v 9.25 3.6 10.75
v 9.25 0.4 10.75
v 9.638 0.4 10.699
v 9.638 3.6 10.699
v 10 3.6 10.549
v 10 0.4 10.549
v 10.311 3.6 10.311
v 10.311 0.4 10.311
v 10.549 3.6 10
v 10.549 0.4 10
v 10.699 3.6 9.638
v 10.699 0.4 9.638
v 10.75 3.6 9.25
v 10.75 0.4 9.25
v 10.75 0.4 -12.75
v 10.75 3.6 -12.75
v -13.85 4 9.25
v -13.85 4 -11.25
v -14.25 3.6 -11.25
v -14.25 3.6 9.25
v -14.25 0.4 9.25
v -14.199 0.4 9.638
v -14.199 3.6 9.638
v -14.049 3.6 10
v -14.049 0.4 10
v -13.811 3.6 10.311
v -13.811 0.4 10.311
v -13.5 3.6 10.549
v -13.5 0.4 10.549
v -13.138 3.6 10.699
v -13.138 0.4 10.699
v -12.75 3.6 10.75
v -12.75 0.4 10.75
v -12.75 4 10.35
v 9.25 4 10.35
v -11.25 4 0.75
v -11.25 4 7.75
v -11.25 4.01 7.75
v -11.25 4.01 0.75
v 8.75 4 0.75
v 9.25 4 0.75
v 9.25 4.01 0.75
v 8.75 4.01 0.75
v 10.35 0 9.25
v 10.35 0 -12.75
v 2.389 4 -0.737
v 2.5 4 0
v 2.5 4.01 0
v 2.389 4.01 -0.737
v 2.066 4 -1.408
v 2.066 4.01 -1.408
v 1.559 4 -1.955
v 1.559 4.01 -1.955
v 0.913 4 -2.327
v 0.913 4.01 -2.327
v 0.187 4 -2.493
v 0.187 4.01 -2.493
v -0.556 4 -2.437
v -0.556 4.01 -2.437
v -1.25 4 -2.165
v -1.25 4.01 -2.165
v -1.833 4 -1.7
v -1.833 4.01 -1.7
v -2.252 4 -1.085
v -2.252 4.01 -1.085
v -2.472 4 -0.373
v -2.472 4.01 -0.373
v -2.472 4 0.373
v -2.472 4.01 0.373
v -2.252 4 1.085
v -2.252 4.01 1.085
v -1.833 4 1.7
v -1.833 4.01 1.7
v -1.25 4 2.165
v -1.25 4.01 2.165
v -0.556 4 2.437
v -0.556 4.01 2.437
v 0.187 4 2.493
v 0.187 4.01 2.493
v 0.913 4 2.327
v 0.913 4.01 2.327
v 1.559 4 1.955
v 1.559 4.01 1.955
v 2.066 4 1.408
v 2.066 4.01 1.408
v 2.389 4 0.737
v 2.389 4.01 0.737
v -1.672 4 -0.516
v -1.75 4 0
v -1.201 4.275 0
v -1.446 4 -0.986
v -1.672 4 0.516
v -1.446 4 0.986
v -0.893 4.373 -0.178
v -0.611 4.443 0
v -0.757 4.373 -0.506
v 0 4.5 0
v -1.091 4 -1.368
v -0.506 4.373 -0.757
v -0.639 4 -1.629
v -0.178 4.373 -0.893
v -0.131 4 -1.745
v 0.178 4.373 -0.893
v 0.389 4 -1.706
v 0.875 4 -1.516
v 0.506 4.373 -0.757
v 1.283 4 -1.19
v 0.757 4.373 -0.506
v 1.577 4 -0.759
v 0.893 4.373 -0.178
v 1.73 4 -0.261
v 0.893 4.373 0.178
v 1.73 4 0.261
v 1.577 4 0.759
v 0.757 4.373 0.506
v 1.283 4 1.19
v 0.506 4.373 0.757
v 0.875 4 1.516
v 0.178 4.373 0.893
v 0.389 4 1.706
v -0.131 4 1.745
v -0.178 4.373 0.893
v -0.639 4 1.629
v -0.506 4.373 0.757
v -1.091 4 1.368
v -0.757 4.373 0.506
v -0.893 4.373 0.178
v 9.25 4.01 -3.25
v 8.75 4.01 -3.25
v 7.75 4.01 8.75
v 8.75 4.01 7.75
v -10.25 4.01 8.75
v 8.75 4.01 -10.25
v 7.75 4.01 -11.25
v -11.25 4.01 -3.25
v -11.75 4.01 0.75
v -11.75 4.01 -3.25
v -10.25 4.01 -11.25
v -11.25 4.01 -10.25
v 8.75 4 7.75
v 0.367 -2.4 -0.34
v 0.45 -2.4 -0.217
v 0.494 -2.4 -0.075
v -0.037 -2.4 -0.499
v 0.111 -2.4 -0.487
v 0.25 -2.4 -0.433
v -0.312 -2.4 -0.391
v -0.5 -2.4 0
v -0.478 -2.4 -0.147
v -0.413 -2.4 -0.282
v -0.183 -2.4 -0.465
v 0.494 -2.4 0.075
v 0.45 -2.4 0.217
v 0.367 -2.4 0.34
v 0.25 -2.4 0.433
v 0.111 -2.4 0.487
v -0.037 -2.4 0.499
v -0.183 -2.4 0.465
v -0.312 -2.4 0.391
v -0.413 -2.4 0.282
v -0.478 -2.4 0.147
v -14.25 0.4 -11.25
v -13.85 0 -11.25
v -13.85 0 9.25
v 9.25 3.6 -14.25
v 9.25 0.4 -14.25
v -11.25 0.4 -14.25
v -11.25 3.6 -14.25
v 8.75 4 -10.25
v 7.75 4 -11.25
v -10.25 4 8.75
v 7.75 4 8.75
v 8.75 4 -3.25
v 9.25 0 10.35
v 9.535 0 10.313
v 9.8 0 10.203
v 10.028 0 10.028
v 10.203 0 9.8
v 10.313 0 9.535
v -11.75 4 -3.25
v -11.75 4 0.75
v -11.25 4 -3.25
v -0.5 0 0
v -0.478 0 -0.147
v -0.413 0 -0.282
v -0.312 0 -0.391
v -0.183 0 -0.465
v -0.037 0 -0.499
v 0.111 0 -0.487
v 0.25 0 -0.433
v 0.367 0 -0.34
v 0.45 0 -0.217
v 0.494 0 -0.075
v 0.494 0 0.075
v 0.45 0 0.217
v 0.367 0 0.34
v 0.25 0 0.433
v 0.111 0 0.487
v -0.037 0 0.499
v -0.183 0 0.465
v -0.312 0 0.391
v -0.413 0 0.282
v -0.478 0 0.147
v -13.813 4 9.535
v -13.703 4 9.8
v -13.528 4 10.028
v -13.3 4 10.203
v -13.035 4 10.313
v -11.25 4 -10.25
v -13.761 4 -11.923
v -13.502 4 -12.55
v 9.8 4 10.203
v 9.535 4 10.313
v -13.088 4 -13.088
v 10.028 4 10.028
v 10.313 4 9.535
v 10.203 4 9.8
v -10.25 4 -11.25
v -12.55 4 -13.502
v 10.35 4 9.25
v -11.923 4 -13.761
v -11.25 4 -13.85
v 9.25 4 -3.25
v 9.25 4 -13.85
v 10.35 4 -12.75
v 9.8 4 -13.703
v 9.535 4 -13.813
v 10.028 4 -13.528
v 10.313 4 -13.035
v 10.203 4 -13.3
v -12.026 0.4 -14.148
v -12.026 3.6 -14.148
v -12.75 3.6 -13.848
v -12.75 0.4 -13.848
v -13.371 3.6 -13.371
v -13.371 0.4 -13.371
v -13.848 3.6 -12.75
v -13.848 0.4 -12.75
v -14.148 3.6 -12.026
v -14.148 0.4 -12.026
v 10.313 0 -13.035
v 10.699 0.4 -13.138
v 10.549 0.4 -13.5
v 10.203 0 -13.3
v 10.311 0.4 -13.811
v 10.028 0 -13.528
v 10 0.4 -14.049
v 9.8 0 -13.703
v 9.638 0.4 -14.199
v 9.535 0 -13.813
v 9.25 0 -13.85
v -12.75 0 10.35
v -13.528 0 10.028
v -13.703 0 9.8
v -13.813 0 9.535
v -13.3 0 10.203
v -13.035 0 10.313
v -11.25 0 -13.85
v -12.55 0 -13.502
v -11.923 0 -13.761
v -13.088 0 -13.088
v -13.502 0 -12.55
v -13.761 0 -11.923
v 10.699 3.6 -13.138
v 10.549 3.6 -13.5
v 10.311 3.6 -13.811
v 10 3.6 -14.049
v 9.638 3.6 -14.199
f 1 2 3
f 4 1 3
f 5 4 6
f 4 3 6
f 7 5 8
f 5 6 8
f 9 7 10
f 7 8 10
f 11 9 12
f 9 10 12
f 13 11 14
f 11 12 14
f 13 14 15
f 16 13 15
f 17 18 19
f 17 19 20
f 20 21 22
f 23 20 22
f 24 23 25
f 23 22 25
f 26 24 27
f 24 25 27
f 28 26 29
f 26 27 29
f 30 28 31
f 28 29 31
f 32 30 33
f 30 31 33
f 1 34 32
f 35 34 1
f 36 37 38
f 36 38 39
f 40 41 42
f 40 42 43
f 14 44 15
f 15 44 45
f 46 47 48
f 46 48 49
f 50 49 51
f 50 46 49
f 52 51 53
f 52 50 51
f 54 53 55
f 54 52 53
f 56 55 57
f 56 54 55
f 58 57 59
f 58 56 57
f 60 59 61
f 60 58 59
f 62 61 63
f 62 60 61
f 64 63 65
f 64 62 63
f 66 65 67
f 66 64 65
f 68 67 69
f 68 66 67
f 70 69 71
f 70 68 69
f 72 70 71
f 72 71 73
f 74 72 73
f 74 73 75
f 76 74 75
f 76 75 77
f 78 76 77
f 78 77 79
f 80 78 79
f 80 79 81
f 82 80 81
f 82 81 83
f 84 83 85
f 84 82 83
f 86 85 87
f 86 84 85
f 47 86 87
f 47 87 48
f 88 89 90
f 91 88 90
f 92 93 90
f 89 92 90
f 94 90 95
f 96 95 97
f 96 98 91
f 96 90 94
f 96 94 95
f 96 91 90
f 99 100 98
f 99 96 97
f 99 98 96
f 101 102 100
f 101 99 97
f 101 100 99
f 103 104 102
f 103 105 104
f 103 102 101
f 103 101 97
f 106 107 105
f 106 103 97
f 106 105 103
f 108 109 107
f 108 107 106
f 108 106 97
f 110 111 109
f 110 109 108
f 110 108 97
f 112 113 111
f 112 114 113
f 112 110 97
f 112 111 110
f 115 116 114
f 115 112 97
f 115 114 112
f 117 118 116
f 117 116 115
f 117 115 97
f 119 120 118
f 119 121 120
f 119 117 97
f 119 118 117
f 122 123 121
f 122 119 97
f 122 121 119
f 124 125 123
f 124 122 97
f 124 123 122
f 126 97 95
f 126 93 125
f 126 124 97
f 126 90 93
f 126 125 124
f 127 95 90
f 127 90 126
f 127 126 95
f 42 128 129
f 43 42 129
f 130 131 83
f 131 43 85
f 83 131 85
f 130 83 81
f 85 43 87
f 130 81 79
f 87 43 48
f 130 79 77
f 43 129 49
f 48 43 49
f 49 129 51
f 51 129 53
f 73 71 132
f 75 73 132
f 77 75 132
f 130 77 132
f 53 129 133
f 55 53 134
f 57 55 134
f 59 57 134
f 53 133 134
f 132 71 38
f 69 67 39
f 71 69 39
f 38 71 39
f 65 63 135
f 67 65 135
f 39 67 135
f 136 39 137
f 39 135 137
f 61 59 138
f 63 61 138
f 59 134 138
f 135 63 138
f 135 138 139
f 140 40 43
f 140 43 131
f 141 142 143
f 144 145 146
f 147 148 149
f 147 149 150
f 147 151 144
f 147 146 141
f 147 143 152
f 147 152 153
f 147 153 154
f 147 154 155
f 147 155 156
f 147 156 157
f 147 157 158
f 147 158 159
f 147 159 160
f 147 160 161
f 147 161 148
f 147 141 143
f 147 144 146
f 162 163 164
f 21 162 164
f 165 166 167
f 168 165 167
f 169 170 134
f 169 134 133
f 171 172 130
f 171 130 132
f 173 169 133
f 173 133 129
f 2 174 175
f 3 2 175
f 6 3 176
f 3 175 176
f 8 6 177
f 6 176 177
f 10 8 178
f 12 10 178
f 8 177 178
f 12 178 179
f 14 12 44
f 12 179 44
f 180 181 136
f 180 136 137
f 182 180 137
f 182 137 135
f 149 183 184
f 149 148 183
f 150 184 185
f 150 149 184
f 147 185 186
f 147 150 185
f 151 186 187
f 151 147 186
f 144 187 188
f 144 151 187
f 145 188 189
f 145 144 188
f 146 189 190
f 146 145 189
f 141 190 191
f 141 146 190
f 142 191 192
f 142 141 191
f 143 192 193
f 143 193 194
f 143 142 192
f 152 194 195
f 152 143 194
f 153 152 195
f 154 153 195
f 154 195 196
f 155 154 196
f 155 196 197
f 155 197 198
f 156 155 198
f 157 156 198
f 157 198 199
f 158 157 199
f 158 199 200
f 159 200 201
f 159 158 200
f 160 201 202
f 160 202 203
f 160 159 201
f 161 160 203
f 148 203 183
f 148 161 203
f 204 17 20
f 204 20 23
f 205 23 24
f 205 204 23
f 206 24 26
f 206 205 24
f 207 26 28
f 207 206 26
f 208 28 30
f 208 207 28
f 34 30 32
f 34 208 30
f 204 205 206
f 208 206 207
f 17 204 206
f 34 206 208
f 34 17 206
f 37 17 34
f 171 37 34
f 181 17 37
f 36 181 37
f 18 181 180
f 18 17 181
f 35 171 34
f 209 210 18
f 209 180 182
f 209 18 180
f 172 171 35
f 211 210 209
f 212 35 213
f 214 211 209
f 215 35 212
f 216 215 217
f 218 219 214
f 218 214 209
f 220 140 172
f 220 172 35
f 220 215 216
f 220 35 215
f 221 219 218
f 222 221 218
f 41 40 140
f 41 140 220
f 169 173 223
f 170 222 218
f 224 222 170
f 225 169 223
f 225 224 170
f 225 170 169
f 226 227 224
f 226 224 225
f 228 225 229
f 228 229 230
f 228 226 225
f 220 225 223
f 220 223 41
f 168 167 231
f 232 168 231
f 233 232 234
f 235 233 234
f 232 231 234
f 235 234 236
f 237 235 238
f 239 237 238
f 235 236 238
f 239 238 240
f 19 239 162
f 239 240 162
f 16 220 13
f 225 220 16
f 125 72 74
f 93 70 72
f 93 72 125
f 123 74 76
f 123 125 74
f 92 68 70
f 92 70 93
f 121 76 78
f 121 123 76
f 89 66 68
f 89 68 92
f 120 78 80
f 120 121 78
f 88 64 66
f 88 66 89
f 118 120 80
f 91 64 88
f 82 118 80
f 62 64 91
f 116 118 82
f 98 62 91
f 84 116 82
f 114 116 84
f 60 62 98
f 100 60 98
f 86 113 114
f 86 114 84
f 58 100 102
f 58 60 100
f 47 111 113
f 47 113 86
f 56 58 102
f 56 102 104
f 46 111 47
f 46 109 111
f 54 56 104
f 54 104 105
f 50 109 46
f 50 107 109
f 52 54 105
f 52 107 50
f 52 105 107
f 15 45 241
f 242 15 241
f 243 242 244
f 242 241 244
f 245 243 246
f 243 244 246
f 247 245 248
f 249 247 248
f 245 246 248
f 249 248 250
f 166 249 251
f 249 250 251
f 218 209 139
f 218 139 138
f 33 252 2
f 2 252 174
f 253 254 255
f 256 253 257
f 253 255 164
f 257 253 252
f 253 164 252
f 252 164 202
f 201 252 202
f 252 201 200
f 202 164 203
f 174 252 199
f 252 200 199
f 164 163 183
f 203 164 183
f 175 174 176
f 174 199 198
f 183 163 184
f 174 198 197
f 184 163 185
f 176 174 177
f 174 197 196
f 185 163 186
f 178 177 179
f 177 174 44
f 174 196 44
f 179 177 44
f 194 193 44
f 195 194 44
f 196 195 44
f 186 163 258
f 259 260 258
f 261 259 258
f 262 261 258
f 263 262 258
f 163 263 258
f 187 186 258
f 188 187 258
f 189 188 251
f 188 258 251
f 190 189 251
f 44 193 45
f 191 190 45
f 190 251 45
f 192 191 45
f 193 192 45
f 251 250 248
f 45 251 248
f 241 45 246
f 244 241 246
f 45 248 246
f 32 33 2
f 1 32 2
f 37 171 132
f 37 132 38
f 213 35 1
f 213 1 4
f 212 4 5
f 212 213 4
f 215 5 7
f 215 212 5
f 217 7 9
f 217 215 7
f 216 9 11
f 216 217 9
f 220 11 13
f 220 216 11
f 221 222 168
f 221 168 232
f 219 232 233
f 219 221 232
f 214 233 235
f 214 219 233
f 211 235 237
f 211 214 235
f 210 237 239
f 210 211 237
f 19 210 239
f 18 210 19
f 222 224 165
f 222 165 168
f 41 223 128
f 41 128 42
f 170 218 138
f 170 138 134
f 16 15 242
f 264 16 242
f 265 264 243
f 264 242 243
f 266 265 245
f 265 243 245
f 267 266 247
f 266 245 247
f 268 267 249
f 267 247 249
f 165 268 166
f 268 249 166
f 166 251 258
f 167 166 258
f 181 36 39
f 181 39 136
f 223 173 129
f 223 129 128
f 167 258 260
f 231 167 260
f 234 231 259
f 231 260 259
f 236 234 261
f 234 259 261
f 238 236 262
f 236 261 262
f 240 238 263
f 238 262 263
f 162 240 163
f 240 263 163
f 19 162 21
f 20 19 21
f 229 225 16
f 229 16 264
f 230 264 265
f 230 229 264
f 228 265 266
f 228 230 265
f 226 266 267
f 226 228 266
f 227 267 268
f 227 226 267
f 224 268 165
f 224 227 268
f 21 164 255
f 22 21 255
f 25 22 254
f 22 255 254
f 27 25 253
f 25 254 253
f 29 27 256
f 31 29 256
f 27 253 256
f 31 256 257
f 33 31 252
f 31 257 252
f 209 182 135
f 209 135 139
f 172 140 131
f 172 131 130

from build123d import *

# Parameters (mm, degrees)
BOSS_EXTRUDE1_DEPTH = 4
CHAMFER1_SIZE       = 0.4
BOSS_EXTRUDE2_START = 4
SKETCH3_R           = 2.5
BOSS_EXTRUDE2_DEPTH = 0.01


with BuildPart() as part:
    # Sketch1 → Boss-Extrude1 (new body)
    with BuildSketch(Plane(origin=(0, 0, 0), x_dir=(1, 0, 0), z_dir=(0, 1, 0))):
        with BuildLine():
            Line((-12.75, -10.75), (9.25, -10.75))
            ThreePointArc((9.25, -10.75), (10.310660172, -10.310660172), (10.75, -9.25))
            Line((10.75, -9.25), (10.75, 12.75))
            ThreePointArc((10.75, 12.75), (10.310660172, 13.810660172), (9.25, 14.25))
            Line((9.25, 14.25), (-11.25, 14.25))
            ThreePointArc((-11.25, 14.25), (-13.371320344, 13.371320344), (-14.25, 11.25))
            Line((-14.25, 11.25), (-14.25, -9.25))
            ThreePointArc((-14.25, -9.25), (-13.810660172, -10.310660172), (-12.75, -10.75))
        make_face()
    extrude(amount=BOSS_EXTRUDE1_DEPTH)

    # Chamfer1
    chamfer1_edges = [part.edges().sort_by_distance(p)[0] for p in [
        (-13.810660172, 4, 10.310660172),
        (-14.25, 0, -1),
        (-13.371320344, 0, -13.371320344),
        (-1.75, 4, 10.75),
        (10.310660172, 4, 10.310660172),
        (10.75, 4, -1.75),
        (10.310660172, 4, -13.810660172),
        (-1, 4, -14.25),
        (-13.371320344, 4, -13.371320344),
        (-14.25, 4, -1),
        (-1, 0, -14.25),
        (10.310660172, 0, -13.810660172),
        (10.75, 0, -1.75),
        (10.310660172, 0, 10.310660172),
        (-1.75, 0, 10.75),
        (-13.810660172, 0, 10.310660172),
    ]]
    chamfer(chamfer1_edges, length=CHAMFER1_SIZE)

    # Sketch2 → Revolve1 (revolve)
    with BuildSketch(Plane.XY):
        with BuildLine():
            Line((-3.215339078, 1.983898683), (-0.5, 1.983898683))
            Line((-0.5, 1.983898683), (-0.5, -2.4))
            Line((-0.5, -2.4), (0, -2.4))
            Line((0, -2.4), (0, 4.5))
            ThreePointArc((0, 4.5), (-2.041394819, 3.796209153), (-3.215339078, 1.983898683))
        make_face()
    revolve(axis=Axis((0, 5.892068095, 0), (0, -1, 0)))

    # Sketch3 → Boss-Extrude2 (add)
    with BuildSketch(Plane(origin=(0, 0, 0), x_dir=(1, 0, 0), z_dir=(0, 1, 0)).offset(BOSS_EXTRUDE2_START)):
        Polygon((-10.25, 11.25), (7.75, 11.25), (8.75, 10.25), (8.75, 3.25), (9.25, 3.25), (9.25, -0.75), (8.75, -0.75), (8.75, -7.75), (7.75, -8.75), (-10.25, -8.75), (-11.25, -7.75), (-11.25, -0.75), (-11.75, -0.75), (-11.75, 3.25), (-11.25, 3.25), (-11.25, 10.25), align=None)
        Circle(SKETCH3_R, mode=Mode.SUBTRACT)
    extrude(amount=BOSS_EXTRUDE2_DEPTH)


solid = part.part
